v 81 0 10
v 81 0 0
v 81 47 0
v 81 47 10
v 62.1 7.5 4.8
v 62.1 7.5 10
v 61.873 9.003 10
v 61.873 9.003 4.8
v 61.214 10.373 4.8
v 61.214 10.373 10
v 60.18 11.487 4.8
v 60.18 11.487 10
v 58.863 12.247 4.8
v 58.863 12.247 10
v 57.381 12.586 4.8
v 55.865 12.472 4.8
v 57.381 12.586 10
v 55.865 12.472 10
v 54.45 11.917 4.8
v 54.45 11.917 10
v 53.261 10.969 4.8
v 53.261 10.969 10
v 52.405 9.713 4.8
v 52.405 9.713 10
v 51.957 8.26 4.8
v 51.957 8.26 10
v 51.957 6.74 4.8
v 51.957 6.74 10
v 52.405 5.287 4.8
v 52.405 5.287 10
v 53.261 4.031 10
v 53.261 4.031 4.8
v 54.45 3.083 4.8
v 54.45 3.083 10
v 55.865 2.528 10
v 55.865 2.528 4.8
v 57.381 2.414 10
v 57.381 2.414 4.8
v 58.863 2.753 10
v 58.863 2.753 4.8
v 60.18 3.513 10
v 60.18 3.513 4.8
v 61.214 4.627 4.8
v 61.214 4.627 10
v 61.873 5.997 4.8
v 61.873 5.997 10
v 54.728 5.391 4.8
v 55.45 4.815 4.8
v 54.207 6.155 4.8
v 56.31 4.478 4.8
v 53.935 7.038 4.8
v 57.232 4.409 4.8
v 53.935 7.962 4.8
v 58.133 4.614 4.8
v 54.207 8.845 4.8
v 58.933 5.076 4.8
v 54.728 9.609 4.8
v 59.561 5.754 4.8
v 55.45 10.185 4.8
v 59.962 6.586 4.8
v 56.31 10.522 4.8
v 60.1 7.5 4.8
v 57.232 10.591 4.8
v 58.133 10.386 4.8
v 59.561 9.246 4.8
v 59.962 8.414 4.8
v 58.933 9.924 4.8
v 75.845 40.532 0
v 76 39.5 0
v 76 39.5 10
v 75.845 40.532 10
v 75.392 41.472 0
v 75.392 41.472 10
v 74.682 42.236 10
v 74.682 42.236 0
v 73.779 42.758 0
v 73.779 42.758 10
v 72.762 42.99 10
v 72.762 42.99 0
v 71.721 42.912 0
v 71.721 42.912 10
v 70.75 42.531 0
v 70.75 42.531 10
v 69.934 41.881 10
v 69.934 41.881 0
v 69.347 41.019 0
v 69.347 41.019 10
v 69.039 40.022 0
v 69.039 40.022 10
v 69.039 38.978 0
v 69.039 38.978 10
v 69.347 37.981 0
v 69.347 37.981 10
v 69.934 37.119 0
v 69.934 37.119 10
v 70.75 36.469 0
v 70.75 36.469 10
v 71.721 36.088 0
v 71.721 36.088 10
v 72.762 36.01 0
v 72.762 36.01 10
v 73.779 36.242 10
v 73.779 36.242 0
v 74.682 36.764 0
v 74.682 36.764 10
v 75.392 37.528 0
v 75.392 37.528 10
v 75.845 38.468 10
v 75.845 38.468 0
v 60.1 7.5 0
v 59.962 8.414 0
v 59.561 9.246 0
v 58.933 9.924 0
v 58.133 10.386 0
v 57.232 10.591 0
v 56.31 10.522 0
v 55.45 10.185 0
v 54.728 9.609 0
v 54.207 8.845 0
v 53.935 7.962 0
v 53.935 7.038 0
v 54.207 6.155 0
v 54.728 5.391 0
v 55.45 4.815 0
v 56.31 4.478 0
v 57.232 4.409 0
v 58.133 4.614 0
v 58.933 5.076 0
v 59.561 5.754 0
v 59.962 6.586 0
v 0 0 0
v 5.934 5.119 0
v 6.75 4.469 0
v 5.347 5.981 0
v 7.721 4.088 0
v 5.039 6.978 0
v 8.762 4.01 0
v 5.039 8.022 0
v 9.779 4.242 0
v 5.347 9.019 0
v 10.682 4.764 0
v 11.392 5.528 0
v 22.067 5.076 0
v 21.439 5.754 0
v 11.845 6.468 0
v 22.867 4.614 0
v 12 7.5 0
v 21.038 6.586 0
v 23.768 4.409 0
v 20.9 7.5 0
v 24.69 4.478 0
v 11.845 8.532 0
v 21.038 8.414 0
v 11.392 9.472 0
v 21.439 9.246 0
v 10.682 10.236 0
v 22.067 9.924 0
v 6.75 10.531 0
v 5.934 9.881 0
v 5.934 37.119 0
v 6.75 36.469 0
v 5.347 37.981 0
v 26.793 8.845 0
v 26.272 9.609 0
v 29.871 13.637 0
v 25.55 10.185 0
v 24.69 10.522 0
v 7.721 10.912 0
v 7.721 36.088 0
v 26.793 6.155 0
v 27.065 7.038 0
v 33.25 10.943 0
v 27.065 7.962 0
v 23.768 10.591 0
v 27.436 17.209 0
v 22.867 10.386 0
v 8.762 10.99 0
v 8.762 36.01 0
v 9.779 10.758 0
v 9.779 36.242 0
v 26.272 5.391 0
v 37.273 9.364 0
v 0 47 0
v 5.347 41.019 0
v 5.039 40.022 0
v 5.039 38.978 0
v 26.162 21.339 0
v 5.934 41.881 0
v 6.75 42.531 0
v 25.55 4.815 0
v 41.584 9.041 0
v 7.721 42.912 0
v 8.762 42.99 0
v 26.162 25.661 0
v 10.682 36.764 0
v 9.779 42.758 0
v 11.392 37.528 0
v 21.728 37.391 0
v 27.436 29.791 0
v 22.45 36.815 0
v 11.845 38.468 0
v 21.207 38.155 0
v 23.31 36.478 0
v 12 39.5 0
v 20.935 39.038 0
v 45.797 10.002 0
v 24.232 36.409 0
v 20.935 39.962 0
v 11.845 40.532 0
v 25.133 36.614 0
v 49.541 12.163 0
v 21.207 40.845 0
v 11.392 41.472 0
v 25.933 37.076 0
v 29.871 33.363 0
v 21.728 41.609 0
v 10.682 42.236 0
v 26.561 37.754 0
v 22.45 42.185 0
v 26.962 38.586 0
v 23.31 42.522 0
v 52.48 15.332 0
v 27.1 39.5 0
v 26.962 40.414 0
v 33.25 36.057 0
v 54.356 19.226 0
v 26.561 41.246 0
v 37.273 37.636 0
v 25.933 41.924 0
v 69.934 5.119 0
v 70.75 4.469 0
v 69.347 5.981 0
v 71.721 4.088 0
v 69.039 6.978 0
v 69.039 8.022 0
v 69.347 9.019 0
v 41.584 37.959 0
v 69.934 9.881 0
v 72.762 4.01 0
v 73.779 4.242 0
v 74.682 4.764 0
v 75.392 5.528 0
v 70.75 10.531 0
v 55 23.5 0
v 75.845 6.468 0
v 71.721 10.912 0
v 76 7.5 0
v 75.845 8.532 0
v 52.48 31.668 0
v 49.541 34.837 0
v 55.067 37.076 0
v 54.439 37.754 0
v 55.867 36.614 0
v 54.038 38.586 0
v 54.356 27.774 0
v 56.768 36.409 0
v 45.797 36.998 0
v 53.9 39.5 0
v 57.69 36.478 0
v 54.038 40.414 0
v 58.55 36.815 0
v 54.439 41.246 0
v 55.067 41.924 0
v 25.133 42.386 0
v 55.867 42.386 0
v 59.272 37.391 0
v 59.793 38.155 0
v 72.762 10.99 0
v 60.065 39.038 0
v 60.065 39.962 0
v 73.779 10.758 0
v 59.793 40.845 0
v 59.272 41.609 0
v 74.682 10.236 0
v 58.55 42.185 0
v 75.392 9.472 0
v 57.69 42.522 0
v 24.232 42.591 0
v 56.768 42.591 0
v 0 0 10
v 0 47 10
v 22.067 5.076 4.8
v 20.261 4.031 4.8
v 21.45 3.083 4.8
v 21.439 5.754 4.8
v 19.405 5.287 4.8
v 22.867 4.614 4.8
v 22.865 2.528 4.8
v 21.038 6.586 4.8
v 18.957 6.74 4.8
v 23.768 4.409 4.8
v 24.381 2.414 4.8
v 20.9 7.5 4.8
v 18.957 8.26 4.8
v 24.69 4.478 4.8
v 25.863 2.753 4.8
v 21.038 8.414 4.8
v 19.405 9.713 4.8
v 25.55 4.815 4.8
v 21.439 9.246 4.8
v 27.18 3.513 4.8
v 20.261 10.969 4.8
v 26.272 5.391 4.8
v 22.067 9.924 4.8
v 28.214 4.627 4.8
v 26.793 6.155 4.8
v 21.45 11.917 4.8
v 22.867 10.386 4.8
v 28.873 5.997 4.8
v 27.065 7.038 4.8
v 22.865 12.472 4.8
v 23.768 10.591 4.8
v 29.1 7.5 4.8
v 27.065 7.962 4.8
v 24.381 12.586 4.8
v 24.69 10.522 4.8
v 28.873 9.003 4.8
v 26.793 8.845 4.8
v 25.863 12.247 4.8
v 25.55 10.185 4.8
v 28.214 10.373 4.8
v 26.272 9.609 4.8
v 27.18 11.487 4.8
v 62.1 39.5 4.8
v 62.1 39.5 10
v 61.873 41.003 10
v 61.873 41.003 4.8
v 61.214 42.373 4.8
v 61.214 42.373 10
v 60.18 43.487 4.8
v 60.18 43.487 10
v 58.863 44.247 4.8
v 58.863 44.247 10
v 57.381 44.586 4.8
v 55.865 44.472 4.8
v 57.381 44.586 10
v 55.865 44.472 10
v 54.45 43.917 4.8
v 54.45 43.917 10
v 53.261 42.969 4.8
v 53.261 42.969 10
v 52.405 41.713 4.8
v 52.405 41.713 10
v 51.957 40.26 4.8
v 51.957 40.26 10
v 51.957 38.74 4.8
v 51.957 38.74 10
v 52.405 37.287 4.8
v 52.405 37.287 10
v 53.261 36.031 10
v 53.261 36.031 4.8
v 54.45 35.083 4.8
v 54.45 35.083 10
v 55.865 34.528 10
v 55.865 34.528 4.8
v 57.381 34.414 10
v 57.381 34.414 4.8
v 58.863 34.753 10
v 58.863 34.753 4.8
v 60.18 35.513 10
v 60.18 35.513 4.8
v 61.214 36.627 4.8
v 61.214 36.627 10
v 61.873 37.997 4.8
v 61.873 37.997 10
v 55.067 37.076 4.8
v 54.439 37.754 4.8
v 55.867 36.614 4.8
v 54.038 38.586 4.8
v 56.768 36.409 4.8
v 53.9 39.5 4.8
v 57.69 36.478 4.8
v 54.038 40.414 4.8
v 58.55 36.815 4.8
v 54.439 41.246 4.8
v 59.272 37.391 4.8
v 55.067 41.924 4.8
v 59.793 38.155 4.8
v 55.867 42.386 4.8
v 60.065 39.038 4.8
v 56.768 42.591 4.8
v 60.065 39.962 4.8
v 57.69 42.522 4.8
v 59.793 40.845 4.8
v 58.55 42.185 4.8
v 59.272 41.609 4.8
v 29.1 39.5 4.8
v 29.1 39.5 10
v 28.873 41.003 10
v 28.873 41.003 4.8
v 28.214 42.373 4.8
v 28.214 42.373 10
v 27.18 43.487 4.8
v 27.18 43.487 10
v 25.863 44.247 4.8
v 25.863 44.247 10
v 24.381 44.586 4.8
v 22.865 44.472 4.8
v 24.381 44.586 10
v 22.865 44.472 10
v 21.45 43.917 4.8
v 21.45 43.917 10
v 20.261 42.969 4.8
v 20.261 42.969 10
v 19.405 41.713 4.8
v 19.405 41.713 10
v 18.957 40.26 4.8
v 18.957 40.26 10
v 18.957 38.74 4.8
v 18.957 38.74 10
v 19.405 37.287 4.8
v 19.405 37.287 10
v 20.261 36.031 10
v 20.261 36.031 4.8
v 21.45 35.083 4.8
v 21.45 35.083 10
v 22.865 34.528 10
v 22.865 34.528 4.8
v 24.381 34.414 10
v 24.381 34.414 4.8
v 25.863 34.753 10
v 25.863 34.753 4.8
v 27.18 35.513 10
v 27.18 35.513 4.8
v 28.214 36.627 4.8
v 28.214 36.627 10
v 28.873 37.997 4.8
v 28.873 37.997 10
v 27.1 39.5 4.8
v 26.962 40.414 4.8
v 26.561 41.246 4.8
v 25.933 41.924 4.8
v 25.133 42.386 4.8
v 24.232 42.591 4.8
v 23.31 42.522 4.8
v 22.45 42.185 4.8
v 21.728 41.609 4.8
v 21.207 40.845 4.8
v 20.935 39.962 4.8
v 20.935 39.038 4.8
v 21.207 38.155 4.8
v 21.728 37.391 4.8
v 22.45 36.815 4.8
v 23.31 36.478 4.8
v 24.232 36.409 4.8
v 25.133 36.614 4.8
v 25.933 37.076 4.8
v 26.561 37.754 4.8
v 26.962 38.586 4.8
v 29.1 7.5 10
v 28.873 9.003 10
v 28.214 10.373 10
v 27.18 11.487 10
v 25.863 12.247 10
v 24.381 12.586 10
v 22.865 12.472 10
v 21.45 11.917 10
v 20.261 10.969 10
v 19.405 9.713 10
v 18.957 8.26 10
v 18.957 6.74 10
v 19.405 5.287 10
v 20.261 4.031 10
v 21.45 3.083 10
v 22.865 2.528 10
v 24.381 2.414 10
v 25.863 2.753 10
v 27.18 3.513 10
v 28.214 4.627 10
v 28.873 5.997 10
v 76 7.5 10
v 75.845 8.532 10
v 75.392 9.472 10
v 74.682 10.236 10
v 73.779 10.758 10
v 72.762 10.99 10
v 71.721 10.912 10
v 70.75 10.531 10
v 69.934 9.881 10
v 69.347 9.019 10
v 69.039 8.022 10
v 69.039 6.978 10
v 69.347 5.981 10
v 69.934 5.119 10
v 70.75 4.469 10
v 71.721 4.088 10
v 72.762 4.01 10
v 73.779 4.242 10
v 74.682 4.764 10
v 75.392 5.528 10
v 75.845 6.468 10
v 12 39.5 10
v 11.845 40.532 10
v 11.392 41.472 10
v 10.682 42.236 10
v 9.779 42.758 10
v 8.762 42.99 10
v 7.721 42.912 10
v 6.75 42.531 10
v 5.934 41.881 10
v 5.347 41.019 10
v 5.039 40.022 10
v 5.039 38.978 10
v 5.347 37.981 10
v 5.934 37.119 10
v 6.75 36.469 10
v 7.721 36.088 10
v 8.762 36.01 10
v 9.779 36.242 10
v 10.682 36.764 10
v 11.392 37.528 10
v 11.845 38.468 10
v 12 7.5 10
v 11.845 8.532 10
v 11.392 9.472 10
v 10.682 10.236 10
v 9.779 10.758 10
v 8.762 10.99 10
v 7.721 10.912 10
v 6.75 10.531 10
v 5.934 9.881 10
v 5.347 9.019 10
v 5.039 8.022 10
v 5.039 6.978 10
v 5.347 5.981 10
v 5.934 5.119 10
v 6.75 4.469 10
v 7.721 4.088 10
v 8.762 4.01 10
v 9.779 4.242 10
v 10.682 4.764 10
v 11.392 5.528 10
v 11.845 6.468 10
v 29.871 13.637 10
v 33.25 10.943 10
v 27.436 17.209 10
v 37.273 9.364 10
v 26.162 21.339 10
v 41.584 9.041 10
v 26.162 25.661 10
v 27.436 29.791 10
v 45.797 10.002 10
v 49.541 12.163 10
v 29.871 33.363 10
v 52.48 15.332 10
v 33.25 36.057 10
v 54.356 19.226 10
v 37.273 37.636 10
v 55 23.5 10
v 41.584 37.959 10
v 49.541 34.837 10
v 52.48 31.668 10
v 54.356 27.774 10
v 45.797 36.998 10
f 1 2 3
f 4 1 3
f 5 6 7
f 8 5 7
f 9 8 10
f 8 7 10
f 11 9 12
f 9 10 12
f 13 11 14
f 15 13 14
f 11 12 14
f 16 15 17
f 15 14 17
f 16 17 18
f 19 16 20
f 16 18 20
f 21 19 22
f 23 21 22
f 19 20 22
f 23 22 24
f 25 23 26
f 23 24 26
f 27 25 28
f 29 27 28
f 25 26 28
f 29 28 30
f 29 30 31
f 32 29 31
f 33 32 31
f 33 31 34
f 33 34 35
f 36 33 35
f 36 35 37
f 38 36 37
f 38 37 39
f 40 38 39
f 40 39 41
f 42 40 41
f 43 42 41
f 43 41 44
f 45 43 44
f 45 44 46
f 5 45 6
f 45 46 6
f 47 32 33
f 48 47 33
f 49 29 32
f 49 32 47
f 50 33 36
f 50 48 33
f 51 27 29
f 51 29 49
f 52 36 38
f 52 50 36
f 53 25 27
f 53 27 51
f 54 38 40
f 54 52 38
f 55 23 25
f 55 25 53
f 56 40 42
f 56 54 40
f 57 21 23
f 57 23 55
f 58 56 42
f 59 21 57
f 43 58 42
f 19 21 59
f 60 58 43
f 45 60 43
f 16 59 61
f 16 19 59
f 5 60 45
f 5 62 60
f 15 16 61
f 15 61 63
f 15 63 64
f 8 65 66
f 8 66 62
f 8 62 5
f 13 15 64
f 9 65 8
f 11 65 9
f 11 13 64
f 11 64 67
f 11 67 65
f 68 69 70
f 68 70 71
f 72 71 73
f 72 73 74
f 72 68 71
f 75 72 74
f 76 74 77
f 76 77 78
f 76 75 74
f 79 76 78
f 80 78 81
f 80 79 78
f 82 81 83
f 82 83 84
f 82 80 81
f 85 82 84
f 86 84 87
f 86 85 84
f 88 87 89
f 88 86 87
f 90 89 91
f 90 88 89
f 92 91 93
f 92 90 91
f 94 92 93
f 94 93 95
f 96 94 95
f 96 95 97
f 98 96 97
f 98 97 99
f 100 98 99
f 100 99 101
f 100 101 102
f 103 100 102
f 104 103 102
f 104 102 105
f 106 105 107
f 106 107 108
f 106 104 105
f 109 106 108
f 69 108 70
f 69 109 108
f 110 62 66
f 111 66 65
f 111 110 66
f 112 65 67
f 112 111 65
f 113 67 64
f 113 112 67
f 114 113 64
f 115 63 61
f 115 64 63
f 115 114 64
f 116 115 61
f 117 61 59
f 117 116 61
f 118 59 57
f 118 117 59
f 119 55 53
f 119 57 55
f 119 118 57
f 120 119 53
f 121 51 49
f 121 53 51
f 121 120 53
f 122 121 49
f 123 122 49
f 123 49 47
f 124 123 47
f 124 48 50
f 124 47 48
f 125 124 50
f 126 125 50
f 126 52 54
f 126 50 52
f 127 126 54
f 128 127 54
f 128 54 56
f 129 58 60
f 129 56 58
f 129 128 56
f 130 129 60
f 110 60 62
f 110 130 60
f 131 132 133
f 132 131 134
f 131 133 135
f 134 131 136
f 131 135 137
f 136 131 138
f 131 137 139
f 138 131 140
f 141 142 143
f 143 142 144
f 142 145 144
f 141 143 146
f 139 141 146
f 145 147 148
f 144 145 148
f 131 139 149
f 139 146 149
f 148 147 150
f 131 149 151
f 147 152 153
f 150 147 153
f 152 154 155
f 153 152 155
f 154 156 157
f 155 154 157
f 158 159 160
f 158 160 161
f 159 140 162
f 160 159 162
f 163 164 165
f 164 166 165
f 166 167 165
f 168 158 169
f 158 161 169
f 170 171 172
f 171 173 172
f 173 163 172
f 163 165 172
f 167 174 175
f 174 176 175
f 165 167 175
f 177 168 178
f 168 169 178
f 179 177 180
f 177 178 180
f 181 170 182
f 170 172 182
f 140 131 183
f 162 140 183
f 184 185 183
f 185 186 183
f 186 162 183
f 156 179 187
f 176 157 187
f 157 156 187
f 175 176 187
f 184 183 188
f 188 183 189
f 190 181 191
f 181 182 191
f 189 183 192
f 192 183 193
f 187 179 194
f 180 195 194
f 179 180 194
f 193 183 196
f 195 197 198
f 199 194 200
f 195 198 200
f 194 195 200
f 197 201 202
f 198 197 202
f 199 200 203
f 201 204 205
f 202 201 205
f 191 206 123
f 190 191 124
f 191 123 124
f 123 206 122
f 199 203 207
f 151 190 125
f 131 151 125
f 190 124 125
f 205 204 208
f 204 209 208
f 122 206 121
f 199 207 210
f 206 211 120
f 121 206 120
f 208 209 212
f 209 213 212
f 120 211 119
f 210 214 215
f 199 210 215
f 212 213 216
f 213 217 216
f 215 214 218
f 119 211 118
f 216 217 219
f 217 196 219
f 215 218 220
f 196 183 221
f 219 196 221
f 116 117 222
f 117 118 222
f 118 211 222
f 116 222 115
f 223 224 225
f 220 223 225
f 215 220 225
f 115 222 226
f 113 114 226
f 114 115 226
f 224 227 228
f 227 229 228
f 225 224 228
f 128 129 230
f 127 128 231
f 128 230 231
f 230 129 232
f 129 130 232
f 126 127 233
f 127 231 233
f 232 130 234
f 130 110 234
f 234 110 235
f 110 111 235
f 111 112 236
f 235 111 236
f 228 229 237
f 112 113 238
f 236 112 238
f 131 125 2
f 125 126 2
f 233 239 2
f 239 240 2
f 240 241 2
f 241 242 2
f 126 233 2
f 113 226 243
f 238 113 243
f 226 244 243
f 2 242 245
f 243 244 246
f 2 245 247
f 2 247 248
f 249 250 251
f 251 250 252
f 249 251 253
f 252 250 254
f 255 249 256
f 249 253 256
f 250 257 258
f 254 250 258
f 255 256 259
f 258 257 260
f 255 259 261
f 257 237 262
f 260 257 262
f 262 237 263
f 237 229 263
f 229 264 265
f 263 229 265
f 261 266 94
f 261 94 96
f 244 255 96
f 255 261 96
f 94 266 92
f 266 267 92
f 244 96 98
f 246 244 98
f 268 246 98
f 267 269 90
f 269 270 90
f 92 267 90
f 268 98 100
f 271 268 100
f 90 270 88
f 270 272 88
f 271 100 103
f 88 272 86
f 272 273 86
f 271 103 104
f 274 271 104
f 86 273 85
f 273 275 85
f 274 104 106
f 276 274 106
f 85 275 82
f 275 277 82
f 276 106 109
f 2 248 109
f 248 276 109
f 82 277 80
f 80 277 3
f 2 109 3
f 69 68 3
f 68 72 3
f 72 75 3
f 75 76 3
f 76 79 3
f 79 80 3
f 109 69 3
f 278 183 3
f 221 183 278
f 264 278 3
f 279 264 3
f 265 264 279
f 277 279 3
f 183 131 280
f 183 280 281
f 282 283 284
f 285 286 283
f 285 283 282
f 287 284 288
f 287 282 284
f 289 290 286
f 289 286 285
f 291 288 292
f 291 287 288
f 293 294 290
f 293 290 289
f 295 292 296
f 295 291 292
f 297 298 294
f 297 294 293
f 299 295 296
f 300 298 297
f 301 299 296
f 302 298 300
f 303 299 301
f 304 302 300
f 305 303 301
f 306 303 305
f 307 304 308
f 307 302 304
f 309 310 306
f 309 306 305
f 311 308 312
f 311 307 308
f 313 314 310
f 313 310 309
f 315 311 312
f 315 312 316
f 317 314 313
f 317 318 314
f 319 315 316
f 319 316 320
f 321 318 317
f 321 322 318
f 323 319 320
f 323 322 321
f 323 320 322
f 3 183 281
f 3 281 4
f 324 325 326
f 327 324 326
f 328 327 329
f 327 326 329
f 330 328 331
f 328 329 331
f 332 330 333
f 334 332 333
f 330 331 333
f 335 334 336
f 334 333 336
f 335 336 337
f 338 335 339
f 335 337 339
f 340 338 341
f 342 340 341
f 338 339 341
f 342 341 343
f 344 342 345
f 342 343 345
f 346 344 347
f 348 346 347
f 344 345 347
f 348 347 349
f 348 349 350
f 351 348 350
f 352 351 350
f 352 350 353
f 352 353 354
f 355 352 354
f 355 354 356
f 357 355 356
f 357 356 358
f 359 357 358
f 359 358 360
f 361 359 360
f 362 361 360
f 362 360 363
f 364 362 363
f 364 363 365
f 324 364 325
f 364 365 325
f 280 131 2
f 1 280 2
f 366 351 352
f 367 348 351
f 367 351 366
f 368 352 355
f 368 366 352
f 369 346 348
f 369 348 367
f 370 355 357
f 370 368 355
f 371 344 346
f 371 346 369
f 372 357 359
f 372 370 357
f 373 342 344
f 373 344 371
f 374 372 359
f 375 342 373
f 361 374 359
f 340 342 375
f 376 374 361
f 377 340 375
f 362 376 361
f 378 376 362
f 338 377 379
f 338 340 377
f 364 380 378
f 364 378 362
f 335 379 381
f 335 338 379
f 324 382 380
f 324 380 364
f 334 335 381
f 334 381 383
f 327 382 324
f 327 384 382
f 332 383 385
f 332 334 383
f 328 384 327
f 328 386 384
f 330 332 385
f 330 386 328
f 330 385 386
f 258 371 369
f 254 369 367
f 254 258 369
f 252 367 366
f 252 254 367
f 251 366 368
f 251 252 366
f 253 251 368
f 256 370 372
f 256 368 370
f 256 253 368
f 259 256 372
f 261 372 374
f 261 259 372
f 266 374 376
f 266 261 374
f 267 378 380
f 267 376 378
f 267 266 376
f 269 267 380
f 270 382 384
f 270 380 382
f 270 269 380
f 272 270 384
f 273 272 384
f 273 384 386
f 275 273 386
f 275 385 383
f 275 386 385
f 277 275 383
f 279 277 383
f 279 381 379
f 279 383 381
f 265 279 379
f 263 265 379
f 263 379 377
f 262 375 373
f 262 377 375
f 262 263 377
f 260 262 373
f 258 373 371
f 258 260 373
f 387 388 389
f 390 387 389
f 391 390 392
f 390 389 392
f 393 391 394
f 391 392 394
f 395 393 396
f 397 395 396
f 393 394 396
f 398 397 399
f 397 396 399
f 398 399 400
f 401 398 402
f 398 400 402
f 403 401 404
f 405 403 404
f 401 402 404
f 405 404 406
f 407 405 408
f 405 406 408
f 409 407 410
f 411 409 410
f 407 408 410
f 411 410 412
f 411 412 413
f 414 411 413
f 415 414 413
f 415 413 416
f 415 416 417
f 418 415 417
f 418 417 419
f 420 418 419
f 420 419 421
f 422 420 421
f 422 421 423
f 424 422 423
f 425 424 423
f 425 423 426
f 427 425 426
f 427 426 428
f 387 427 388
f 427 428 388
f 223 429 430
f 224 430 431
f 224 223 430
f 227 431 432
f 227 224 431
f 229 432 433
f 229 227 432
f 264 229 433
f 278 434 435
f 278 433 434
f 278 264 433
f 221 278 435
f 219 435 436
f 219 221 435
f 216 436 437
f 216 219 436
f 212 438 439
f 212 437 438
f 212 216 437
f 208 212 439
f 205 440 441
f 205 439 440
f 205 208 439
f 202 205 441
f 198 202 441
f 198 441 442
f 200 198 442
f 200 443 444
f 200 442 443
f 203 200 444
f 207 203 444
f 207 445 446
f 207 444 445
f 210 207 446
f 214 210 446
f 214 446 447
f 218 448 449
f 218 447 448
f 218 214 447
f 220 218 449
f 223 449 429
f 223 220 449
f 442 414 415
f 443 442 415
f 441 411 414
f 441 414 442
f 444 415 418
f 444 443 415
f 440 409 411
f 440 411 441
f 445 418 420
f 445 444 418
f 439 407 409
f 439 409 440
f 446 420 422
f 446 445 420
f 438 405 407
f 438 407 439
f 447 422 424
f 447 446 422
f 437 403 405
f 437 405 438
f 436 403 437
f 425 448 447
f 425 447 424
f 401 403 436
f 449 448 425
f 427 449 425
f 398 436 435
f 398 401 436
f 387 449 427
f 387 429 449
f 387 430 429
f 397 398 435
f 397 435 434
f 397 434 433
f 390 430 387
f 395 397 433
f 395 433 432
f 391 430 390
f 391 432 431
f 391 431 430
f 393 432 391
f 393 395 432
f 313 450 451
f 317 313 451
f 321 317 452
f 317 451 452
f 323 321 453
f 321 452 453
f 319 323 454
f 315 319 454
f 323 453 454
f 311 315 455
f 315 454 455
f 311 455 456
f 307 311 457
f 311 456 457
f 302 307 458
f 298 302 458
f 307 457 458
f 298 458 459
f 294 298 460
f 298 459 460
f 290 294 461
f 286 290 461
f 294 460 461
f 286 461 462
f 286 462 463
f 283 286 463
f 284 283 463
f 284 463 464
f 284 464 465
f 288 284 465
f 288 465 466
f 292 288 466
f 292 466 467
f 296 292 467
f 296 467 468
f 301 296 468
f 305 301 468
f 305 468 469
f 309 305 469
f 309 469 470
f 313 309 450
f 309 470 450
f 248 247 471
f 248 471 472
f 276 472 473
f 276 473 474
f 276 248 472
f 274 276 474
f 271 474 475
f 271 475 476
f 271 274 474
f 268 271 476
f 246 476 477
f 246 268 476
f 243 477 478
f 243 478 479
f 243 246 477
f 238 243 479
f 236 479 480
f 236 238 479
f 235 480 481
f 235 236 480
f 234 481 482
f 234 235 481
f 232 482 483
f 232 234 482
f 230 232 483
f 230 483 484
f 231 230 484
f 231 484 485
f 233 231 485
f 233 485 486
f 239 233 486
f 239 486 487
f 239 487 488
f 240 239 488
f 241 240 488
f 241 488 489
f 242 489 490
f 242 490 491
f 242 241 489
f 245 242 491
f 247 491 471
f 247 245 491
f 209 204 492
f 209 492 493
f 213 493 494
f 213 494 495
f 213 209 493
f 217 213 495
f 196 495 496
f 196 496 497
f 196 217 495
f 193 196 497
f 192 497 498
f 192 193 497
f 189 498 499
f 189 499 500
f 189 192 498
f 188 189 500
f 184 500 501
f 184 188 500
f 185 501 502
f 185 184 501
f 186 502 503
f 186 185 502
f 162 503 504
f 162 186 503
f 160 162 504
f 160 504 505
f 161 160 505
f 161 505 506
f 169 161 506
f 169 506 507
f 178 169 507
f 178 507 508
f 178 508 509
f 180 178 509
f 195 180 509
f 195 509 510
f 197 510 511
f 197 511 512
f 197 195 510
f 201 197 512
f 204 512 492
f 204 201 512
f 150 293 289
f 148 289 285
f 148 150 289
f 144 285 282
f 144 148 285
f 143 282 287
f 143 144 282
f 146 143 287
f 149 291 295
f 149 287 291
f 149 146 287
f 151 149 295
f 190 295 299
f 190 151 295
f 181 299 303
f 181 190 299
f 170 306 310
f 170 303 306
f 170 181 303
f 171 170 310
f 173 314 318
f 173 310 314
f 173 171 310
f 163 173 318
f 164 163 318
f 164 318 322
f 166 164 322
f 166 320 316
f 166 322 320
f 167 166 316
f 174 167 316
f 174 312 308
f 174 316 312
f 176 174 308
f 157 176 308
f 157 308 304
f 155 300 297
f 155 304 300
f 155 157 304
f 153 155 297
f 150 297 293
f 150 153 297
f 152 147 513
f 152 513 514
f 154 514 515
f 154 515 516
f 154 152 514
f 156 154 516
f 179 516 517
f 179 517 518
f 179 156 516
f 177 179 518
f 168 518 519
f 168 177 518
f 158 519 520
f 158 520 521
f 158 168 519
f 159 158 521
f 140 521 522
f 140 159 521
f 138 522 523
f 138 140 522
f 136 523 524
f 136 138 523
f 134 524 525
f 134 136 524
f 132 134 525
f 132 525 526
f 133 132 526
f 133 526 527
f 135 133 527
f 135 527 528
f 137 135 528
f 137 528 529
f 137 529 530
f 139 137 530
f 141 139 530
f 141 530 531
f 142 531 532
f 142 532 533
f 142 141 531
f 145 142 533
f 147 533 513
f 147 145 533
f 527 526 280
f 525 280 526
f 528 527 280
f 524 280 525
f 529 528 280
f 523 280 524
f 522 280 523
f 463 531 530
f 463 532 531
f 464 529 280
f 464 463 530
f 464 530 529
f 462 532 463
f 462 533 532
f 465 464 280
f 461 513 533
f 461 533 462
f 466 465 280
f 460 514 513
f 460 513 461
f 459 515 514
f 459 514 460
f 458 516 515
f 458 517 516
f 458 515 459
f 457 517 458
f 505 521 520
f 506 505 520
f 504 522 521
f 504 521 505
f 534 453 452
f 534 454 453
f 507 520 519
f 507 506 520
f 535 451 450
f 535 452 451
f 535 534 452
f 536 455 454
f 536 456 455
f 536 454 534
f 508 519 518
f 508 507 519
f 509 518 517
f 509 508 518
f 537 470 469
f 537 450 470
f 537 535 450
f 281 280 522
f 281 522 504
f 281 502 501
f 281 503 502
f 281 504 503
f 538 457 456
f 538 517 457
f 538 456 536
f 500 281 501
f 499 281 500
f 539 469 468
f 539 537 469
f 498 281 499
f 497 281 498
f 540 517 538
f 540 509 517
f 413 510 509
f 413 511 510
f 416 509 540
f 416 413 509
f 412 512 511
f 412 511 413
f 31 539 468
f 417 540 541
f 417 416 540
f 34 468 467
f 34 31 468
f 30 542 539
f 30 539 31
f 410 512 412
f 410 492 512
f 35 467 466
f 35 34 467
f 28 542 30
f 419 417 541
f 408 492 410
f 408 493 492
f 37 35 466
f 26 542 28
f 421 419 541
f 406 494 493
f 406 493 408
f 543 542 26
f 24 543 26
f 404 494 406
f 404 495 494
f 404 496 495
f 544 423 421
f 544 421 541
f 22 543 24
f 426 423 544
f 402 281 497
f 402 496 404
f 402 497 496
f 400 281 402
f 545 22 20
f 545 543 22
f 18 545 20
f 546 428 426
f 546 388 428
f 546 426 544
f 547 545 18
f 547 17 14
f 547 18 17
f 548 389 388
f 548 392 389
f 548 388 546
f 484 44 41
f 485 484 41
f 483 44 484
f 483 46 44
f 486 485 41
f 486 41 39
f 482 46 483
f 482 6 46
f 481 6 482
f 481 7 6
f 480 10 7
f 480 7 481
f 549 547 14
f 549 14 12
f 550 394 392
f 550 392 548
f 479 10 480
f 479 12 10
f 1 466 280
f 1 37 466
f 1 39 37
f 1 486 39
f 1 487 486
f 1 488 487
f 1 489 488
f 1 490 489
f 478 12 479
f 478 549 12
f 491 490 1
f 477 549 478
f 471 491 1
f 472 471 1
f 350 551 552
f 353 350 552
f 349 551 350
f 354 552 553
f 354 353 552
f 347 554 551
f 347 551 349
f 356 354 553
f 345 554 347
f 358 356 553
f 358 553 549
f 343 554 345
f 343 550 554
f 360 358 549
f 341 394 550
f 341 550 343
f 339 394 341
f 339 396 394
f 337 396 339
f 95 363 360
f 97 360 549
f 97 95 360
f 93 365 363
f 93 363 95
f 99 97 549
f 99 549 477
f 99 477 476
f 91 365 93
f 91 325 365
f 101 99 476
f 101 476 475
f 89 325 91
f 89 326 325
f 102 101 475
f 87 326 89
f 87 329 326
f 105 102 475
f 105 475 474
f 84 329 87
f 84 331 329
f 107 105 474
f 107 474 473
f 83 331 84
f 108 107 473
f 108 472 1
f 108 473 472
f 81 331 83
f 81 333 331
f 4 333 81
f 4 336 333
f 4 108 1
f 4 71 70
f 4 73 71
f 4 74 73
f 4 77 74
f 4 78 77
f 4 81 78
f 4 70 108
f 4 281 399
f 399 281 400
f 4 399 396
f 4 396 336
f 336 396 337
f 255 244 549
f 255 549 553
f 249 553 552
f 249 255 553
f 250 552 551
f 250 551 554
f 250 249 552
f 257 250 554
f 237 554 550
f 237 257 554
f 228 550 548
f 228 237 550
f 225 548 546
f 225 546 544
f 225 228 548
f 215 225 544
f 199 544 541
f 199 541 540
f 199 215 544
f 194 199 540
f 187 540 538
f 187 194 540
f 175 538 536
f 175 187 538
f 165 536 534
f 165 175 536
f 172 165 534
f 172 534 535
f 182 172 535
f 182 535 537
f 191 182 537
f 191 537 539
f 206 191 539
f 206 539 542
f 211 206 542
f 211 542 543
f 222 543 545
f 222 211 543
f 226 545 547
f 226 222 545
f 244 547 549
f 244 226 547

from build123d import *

# Parameters (mm, degrees)
ESQUISSE2_W             = 81
ESQUISSE2_H             = 47
ESQUISSE2_R             = 14.5
ESQUISSE2_R_2           = 3.5
ESQUISSE2_R_3           = 3.1
BOSS_EXTRU_1_DEPTH      = 10
ESQUISSE5_R             = 5.1
ENL_V_MAT_EXTRU_1_DEPTH = 5.2


with BuildPart() as part:
    # Esquisse2 → Boss.-Extru.1 (new body)
    with BuildSketch(Plane.XY):
        with Locations((40.5, 23.5)):
            Rectangle(ESQUISSE2_W, ESQUISSE2_H)
        with Locations((40.5, 23.5)):
            Circle(ESQUISSE2_R, mode=Mode.SUBTRACT)
        with Locations((8.5, 39.5)):
            Circle(ESQUISSE2_R_2, mode=Mode.SUBTRACT)
        with Locations((72.5, 39.5)):
            Circle(ESQUISSE2_R_2, mode=Mode.SUBTRACT)
        with Locations((72.5, 7.5)):
            Circle(ESQUISSE2_R_2, mode=Mode.SUBTRACT)
        with Locations((8.5, 7.5)):
            Circle(ESQUISSE2_R_2, mode=Mode.SUBTRACT)
        with Locations((24, 39.5)):
            Circle(ESQUISSE2_R_3, mode=Mode.SUBTRACT)
        with Locations(Location((57, 39.5, 0), (0, 0, 180))):  # turned: the seam where the file's is
            Circle(ESQUISSE2_R_3, mode=Mode.SUBTRACT)
        with Locations((57, 7.5)):
            Circle(ESQUISSE2_R_3, mode=Mode.SUBTRACT)
        with Locations(Location((24, 7.5, 0), (0, 0, 180))):  # turned: the seam where the file's is
            Circle(ESQUISSE2_R_3, mode=Mode.SUBTRACT)
    extrude(amount=BOSS_EXTRU_1_DEPTH)

    # Esquisse5 → Enlèv. mat.-Extru.1 (cut)
    with BuildSketch(Plane.XY.offset(10)):
        with Locations((24, 39.5)):
            Circle(ESQUISSE5_R)
        with Locations((24, 7.5)):
            Circle(ESQUISSE5_R)
        with Locations((57, 7.5)):
            Circle(ESQUISSE5_R)
        with Locations((57, 39.5)):
            Circle(ESQUISSE5_R)
    extrude(amount=-ENL_V_MAT_EXTRU_1_DEPTH, mode=Mode.SUBTRACT)


solid = part.part
